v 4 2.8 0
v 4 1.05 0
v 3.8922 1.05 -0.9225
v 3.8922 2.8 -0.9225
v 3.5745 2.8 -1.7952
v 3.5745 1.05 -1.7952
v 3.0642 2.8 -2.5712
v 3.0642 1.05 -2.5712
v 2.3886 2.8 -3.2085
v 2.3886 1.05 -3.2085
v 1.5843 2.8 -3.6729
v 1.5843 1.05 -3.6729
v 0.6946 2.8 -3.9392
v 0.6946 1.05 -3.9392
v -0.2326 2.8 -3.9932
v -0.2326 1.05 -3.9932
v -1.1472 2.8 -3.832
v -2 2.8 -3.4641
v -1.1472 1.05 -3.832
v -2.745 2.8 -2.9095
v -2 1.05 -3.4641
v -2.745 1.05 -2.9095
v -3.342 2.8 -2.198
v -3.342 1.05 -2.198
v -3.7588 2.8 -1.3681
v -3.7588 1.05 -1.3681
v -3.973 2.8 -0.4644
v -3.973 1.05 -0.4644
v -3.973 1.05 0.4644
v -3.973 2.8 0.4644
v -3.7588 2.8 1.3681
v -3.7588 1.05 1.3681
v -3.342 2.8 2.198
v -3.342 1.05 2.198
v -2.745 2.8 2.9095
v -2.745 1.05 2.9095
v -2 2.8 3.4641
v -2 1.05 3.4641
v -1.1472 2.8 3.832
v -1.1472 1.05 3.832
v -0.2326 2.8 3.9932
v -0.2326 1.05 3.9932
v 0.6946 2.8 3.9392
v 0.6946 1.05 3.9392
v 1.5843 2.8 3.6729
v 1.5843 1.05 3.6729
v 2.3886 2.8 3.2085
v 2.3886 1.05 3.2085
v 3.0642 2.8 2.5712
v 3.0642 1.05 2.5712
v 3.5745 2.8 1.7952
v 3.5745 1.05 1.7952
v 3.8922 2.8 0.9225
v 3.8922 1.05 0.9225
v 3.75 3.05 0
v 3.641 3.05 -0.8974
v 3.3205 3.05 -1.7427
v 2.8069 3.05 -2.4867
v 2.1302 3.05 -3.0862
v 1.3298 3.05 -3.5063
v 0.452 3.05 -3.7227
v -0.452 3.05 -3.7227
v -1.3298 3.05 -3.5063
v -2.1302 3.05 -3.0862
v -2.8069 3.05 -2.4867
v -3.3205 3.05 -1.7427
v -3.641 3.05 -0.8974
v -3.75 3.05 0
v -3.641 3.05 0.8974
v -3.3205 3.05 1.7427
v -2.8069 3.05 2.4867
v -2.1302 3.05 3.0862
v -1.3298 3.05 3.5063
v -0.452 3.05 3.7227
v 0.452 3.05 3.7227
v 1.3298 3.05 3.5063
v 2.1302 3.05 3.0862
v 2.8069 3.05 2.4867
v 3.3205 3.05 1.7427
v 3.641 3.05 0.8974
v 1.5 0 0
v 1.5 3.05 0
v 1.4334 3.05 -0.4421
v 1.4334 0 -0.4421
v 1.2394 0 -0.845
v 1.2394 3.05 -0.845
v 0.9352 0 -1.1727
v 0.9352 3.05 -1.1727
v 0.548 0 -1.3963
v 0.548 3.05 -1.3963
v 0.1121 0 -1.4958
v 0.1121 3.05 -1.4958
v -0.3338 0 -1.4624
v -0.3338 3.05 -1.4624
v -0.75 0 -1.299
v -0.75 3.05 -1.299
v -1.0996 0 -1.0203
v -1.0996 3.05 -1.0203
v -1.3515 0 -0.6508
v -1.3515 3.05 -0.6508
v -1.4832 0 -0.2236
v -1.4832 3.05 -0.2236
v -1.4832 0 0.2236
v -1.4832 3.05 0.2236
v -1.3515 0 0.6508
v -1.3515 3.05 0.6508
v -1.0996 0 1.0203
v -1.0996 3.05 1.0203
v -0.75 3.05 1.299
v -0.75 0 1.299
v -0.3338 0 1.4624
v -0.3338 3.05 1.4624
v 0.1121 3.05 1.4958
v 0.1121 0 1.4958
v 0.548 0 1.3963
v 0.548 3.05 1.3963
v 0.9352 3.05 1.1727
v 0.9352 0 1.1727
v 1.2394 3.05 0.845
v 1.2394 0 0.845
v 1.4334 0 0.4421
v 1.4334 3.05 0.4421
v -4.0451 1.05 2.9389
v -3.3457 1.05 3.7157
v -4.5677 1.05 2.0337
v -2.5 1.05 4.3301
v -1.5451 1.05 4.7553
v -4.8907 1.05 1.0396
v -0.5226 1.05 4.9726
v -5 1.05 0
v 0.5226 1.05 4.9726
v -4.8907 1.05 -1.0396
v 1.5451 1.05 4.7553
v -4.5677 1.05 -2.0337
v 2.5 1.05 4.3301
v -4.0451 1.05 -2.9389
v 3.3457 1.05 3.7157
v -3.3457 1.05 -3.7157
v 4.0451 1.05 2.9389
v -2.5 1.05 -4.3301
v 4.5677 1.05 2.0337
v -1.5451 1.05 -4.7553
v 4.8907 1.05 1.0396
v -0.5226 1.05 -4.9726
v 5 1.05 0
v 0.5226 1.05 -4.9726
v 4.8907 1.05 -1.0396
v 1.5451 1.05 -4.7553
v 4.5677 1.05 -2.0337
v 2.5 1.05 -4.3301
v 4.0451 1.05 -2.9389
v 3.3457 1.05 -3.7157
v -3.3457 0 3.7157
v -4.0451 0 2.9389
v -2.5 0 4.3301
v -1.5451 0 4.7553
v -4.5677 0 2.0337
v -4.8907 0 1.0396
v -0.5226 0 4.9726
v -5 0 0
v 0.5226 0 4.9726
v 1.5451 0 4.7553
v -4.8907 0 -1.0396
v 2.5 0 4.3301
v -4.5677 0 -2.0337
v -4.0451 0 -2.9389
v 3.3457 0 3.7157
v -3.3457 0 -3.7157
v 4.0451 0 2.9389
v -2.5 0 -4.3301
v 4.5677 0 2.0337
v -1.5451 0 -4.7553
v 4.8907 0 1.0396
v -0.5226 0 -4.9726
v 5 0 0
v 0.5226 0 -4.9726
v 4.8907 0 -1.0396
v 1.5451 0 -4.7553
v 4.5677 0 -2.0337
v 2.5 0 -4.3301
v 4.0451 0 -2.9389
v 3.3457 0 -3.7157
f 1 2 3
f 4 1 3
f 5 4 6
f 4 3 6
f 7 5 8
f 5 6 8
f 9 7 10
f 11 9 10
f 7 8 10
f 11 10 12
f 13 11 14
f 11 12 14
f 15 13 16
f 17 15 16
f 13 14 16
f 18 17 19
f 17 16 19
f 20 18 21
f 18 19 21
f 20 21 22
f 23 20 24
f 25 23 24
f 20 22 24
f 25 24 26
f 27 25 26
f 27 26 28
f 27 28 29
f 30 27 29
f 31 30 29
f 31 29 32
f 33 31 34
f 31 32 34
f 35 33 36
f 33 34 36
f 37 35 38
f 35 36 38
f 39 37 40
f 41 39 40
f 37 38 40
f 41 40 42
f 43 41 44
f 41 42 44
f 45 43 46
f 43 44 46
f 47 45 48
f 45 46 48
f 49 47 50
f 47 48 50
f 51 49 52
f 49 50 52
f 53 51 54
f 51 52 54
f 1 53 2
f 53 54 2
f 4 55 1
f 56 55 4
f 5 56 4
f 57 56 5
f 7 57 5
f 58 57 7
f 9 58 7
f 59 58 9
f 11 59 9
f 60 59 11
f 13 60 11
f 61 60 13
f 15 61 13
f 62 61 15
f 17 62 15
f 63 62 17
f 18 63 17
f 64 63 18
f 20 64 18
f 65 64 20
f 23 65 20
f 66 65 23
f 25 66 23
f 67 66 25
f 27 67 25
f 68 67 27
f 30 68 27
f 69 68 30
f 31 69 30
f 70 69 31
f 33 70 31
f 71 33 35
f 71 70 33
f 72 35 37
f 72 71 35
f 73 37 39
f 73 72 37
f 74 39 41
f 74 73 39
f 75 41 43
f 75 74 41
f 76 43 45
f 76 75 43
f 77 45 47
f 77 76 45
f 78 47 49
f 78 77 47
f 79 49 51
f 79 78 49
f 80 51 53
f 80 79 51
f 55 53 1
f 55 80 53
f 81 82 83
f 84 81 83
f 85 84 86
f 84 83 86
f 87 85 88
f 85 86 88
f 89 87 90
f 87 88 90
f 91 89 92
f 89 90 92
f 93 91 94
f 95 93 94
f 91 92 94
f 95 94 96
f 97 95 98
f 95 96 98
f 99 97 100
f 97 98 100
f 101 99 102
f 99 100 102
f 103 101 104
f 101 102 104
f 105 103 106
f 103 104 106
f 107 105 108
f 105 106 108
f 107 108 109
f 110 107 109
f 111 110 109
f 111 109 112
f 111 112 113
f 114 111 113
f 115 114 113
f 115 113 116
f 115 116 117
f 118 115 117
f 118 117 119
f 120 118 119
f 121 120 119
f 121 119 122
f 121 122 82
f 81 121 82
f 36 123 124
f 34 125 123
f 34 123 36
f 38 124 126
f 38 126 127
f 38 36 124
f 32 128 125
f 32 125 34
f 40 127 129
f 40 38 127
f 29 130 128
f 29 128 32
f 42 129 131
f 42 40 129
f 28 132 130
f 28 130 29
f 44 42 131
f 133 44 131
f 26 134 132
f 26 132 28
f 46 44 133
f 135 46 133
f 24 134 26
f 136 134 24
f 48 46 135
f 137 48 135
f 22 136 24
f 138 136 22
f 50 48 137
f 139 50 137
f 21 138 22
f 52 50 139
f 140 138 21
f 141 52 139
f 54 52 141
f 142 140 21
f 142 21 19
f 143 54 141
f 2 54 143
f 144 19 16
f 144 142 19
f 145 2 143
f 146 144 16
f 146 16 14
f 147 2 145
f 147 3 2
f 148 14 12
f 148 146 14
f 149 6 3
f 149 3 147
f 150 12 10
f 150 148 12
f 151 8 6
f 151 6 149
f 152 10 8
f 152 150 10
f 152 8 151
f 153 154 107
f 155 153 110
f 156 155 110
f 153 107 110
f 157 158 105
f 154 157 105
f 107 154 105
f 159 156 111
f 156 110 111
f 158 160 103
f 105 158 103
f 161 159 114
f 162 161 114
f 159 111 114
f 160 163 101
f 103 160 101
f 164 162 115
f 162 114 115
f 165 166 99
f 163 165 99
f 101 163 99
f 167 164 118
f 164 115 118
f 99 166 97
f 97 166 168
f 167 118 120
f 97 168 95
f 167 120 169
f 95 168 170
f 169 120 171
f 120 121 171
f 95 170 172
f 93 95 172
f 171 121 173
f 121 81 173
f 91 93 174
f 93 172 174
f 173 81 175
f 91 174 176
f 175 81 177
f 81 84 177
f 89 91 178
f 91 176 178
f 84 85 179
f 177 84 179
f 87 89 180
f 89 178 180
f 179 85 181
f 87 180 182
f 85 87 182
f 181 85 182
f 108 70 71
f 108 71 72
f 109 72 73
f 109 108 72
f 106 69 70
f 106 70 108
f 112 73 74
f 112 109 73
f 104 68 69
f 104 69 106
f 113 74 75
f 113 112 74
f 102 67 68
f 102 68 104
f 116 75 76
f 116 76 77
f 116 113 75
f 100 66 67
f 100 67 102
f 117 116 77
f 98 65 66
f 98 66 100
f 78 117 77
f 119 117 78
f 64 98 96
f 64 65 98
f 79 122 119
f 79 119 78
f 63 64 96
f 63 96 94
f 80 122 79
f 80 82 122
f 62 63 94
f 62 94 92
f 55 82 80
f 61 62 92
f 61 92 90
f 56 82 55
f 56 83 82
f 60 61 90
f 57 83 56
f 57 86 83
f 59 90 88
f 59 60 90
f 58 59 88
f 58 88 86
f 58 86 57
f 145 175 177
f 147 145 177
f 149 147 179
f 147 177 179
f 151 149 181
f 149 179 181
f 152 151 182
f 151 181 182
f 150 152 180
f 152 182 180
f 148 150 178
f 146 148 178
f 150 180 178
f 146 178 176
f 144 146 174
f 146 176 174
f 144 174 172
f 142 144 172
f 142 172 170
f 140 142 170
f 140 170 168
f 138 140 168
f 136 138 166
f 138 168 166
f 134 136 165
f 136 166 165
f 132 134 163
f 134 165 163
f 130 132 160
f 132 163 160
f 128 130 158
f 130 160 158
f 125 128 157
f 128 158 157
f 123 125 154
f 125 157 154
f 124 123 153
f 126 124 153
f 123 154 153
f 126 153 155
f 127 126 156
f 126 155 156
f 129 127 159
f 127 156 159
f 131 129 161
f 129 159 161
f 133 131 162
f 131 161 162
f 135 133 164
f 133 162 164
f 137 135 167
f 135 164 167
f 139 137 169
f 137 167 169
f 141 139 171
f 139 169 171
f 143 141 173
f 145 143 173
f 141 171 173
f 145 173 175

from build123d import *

# Parameters (mm, degrees)
SKETCH1_R           = 5
BOSS_EXTRUDE1_DEPTH = 1.05
SKETCH2_R           = 4
BOSS_EXTRUDE2_DEPTH = 2
SKETCH3_R           = 1.5
CUT_EXTRUDE1_DEPTH  = 12
CHAMFER2_SIZE       = 0.25


with BuildPart() as part:
    # Sketch1 → Boss-Extrude1 (new body)
    with BuildSketch(Plane(origin=(0, 0, 0), x_dir=(1, 0, 0), z_dir=(0, 1, 0))):
        Circle(SKETCH1_R)
    extrude(amount=BOSS_EXTRUDE1_DEPTH)

    # Sketch2 → Boss-Extrude2 (add)
    with BuildSketch(Plane(origin=(0, 1.05, 0), x_dir=(1, 0, 0), z_dir=(0, 1, 0))):
        Circle(SKETCH2_R)
    extrude(amount=BOSS_EXTRUDE2_DEPTH)

    # Sketch3 → Cut-Extrude1 (cut)
    with BuildSketch(Plane(origin=(0, 3.05, 0), x_dir=(1, 0, 0), z_dir=(0, 1, 0))):
        Circle(SKETCH3_R)
    extrude(amount=-CUT_EXTRUDE1_DEPTH, mode=Mode.SUBTRACT)

    # Chamfer2
    chamfer2_edges = [part.edges().sort_by_distance(p)[0] for p in [
        (-4, 3.05, 0),
    ]]
    chamfer(chamfer2_edges, length=CHAMFER2_SIZE)


solid = part.part
